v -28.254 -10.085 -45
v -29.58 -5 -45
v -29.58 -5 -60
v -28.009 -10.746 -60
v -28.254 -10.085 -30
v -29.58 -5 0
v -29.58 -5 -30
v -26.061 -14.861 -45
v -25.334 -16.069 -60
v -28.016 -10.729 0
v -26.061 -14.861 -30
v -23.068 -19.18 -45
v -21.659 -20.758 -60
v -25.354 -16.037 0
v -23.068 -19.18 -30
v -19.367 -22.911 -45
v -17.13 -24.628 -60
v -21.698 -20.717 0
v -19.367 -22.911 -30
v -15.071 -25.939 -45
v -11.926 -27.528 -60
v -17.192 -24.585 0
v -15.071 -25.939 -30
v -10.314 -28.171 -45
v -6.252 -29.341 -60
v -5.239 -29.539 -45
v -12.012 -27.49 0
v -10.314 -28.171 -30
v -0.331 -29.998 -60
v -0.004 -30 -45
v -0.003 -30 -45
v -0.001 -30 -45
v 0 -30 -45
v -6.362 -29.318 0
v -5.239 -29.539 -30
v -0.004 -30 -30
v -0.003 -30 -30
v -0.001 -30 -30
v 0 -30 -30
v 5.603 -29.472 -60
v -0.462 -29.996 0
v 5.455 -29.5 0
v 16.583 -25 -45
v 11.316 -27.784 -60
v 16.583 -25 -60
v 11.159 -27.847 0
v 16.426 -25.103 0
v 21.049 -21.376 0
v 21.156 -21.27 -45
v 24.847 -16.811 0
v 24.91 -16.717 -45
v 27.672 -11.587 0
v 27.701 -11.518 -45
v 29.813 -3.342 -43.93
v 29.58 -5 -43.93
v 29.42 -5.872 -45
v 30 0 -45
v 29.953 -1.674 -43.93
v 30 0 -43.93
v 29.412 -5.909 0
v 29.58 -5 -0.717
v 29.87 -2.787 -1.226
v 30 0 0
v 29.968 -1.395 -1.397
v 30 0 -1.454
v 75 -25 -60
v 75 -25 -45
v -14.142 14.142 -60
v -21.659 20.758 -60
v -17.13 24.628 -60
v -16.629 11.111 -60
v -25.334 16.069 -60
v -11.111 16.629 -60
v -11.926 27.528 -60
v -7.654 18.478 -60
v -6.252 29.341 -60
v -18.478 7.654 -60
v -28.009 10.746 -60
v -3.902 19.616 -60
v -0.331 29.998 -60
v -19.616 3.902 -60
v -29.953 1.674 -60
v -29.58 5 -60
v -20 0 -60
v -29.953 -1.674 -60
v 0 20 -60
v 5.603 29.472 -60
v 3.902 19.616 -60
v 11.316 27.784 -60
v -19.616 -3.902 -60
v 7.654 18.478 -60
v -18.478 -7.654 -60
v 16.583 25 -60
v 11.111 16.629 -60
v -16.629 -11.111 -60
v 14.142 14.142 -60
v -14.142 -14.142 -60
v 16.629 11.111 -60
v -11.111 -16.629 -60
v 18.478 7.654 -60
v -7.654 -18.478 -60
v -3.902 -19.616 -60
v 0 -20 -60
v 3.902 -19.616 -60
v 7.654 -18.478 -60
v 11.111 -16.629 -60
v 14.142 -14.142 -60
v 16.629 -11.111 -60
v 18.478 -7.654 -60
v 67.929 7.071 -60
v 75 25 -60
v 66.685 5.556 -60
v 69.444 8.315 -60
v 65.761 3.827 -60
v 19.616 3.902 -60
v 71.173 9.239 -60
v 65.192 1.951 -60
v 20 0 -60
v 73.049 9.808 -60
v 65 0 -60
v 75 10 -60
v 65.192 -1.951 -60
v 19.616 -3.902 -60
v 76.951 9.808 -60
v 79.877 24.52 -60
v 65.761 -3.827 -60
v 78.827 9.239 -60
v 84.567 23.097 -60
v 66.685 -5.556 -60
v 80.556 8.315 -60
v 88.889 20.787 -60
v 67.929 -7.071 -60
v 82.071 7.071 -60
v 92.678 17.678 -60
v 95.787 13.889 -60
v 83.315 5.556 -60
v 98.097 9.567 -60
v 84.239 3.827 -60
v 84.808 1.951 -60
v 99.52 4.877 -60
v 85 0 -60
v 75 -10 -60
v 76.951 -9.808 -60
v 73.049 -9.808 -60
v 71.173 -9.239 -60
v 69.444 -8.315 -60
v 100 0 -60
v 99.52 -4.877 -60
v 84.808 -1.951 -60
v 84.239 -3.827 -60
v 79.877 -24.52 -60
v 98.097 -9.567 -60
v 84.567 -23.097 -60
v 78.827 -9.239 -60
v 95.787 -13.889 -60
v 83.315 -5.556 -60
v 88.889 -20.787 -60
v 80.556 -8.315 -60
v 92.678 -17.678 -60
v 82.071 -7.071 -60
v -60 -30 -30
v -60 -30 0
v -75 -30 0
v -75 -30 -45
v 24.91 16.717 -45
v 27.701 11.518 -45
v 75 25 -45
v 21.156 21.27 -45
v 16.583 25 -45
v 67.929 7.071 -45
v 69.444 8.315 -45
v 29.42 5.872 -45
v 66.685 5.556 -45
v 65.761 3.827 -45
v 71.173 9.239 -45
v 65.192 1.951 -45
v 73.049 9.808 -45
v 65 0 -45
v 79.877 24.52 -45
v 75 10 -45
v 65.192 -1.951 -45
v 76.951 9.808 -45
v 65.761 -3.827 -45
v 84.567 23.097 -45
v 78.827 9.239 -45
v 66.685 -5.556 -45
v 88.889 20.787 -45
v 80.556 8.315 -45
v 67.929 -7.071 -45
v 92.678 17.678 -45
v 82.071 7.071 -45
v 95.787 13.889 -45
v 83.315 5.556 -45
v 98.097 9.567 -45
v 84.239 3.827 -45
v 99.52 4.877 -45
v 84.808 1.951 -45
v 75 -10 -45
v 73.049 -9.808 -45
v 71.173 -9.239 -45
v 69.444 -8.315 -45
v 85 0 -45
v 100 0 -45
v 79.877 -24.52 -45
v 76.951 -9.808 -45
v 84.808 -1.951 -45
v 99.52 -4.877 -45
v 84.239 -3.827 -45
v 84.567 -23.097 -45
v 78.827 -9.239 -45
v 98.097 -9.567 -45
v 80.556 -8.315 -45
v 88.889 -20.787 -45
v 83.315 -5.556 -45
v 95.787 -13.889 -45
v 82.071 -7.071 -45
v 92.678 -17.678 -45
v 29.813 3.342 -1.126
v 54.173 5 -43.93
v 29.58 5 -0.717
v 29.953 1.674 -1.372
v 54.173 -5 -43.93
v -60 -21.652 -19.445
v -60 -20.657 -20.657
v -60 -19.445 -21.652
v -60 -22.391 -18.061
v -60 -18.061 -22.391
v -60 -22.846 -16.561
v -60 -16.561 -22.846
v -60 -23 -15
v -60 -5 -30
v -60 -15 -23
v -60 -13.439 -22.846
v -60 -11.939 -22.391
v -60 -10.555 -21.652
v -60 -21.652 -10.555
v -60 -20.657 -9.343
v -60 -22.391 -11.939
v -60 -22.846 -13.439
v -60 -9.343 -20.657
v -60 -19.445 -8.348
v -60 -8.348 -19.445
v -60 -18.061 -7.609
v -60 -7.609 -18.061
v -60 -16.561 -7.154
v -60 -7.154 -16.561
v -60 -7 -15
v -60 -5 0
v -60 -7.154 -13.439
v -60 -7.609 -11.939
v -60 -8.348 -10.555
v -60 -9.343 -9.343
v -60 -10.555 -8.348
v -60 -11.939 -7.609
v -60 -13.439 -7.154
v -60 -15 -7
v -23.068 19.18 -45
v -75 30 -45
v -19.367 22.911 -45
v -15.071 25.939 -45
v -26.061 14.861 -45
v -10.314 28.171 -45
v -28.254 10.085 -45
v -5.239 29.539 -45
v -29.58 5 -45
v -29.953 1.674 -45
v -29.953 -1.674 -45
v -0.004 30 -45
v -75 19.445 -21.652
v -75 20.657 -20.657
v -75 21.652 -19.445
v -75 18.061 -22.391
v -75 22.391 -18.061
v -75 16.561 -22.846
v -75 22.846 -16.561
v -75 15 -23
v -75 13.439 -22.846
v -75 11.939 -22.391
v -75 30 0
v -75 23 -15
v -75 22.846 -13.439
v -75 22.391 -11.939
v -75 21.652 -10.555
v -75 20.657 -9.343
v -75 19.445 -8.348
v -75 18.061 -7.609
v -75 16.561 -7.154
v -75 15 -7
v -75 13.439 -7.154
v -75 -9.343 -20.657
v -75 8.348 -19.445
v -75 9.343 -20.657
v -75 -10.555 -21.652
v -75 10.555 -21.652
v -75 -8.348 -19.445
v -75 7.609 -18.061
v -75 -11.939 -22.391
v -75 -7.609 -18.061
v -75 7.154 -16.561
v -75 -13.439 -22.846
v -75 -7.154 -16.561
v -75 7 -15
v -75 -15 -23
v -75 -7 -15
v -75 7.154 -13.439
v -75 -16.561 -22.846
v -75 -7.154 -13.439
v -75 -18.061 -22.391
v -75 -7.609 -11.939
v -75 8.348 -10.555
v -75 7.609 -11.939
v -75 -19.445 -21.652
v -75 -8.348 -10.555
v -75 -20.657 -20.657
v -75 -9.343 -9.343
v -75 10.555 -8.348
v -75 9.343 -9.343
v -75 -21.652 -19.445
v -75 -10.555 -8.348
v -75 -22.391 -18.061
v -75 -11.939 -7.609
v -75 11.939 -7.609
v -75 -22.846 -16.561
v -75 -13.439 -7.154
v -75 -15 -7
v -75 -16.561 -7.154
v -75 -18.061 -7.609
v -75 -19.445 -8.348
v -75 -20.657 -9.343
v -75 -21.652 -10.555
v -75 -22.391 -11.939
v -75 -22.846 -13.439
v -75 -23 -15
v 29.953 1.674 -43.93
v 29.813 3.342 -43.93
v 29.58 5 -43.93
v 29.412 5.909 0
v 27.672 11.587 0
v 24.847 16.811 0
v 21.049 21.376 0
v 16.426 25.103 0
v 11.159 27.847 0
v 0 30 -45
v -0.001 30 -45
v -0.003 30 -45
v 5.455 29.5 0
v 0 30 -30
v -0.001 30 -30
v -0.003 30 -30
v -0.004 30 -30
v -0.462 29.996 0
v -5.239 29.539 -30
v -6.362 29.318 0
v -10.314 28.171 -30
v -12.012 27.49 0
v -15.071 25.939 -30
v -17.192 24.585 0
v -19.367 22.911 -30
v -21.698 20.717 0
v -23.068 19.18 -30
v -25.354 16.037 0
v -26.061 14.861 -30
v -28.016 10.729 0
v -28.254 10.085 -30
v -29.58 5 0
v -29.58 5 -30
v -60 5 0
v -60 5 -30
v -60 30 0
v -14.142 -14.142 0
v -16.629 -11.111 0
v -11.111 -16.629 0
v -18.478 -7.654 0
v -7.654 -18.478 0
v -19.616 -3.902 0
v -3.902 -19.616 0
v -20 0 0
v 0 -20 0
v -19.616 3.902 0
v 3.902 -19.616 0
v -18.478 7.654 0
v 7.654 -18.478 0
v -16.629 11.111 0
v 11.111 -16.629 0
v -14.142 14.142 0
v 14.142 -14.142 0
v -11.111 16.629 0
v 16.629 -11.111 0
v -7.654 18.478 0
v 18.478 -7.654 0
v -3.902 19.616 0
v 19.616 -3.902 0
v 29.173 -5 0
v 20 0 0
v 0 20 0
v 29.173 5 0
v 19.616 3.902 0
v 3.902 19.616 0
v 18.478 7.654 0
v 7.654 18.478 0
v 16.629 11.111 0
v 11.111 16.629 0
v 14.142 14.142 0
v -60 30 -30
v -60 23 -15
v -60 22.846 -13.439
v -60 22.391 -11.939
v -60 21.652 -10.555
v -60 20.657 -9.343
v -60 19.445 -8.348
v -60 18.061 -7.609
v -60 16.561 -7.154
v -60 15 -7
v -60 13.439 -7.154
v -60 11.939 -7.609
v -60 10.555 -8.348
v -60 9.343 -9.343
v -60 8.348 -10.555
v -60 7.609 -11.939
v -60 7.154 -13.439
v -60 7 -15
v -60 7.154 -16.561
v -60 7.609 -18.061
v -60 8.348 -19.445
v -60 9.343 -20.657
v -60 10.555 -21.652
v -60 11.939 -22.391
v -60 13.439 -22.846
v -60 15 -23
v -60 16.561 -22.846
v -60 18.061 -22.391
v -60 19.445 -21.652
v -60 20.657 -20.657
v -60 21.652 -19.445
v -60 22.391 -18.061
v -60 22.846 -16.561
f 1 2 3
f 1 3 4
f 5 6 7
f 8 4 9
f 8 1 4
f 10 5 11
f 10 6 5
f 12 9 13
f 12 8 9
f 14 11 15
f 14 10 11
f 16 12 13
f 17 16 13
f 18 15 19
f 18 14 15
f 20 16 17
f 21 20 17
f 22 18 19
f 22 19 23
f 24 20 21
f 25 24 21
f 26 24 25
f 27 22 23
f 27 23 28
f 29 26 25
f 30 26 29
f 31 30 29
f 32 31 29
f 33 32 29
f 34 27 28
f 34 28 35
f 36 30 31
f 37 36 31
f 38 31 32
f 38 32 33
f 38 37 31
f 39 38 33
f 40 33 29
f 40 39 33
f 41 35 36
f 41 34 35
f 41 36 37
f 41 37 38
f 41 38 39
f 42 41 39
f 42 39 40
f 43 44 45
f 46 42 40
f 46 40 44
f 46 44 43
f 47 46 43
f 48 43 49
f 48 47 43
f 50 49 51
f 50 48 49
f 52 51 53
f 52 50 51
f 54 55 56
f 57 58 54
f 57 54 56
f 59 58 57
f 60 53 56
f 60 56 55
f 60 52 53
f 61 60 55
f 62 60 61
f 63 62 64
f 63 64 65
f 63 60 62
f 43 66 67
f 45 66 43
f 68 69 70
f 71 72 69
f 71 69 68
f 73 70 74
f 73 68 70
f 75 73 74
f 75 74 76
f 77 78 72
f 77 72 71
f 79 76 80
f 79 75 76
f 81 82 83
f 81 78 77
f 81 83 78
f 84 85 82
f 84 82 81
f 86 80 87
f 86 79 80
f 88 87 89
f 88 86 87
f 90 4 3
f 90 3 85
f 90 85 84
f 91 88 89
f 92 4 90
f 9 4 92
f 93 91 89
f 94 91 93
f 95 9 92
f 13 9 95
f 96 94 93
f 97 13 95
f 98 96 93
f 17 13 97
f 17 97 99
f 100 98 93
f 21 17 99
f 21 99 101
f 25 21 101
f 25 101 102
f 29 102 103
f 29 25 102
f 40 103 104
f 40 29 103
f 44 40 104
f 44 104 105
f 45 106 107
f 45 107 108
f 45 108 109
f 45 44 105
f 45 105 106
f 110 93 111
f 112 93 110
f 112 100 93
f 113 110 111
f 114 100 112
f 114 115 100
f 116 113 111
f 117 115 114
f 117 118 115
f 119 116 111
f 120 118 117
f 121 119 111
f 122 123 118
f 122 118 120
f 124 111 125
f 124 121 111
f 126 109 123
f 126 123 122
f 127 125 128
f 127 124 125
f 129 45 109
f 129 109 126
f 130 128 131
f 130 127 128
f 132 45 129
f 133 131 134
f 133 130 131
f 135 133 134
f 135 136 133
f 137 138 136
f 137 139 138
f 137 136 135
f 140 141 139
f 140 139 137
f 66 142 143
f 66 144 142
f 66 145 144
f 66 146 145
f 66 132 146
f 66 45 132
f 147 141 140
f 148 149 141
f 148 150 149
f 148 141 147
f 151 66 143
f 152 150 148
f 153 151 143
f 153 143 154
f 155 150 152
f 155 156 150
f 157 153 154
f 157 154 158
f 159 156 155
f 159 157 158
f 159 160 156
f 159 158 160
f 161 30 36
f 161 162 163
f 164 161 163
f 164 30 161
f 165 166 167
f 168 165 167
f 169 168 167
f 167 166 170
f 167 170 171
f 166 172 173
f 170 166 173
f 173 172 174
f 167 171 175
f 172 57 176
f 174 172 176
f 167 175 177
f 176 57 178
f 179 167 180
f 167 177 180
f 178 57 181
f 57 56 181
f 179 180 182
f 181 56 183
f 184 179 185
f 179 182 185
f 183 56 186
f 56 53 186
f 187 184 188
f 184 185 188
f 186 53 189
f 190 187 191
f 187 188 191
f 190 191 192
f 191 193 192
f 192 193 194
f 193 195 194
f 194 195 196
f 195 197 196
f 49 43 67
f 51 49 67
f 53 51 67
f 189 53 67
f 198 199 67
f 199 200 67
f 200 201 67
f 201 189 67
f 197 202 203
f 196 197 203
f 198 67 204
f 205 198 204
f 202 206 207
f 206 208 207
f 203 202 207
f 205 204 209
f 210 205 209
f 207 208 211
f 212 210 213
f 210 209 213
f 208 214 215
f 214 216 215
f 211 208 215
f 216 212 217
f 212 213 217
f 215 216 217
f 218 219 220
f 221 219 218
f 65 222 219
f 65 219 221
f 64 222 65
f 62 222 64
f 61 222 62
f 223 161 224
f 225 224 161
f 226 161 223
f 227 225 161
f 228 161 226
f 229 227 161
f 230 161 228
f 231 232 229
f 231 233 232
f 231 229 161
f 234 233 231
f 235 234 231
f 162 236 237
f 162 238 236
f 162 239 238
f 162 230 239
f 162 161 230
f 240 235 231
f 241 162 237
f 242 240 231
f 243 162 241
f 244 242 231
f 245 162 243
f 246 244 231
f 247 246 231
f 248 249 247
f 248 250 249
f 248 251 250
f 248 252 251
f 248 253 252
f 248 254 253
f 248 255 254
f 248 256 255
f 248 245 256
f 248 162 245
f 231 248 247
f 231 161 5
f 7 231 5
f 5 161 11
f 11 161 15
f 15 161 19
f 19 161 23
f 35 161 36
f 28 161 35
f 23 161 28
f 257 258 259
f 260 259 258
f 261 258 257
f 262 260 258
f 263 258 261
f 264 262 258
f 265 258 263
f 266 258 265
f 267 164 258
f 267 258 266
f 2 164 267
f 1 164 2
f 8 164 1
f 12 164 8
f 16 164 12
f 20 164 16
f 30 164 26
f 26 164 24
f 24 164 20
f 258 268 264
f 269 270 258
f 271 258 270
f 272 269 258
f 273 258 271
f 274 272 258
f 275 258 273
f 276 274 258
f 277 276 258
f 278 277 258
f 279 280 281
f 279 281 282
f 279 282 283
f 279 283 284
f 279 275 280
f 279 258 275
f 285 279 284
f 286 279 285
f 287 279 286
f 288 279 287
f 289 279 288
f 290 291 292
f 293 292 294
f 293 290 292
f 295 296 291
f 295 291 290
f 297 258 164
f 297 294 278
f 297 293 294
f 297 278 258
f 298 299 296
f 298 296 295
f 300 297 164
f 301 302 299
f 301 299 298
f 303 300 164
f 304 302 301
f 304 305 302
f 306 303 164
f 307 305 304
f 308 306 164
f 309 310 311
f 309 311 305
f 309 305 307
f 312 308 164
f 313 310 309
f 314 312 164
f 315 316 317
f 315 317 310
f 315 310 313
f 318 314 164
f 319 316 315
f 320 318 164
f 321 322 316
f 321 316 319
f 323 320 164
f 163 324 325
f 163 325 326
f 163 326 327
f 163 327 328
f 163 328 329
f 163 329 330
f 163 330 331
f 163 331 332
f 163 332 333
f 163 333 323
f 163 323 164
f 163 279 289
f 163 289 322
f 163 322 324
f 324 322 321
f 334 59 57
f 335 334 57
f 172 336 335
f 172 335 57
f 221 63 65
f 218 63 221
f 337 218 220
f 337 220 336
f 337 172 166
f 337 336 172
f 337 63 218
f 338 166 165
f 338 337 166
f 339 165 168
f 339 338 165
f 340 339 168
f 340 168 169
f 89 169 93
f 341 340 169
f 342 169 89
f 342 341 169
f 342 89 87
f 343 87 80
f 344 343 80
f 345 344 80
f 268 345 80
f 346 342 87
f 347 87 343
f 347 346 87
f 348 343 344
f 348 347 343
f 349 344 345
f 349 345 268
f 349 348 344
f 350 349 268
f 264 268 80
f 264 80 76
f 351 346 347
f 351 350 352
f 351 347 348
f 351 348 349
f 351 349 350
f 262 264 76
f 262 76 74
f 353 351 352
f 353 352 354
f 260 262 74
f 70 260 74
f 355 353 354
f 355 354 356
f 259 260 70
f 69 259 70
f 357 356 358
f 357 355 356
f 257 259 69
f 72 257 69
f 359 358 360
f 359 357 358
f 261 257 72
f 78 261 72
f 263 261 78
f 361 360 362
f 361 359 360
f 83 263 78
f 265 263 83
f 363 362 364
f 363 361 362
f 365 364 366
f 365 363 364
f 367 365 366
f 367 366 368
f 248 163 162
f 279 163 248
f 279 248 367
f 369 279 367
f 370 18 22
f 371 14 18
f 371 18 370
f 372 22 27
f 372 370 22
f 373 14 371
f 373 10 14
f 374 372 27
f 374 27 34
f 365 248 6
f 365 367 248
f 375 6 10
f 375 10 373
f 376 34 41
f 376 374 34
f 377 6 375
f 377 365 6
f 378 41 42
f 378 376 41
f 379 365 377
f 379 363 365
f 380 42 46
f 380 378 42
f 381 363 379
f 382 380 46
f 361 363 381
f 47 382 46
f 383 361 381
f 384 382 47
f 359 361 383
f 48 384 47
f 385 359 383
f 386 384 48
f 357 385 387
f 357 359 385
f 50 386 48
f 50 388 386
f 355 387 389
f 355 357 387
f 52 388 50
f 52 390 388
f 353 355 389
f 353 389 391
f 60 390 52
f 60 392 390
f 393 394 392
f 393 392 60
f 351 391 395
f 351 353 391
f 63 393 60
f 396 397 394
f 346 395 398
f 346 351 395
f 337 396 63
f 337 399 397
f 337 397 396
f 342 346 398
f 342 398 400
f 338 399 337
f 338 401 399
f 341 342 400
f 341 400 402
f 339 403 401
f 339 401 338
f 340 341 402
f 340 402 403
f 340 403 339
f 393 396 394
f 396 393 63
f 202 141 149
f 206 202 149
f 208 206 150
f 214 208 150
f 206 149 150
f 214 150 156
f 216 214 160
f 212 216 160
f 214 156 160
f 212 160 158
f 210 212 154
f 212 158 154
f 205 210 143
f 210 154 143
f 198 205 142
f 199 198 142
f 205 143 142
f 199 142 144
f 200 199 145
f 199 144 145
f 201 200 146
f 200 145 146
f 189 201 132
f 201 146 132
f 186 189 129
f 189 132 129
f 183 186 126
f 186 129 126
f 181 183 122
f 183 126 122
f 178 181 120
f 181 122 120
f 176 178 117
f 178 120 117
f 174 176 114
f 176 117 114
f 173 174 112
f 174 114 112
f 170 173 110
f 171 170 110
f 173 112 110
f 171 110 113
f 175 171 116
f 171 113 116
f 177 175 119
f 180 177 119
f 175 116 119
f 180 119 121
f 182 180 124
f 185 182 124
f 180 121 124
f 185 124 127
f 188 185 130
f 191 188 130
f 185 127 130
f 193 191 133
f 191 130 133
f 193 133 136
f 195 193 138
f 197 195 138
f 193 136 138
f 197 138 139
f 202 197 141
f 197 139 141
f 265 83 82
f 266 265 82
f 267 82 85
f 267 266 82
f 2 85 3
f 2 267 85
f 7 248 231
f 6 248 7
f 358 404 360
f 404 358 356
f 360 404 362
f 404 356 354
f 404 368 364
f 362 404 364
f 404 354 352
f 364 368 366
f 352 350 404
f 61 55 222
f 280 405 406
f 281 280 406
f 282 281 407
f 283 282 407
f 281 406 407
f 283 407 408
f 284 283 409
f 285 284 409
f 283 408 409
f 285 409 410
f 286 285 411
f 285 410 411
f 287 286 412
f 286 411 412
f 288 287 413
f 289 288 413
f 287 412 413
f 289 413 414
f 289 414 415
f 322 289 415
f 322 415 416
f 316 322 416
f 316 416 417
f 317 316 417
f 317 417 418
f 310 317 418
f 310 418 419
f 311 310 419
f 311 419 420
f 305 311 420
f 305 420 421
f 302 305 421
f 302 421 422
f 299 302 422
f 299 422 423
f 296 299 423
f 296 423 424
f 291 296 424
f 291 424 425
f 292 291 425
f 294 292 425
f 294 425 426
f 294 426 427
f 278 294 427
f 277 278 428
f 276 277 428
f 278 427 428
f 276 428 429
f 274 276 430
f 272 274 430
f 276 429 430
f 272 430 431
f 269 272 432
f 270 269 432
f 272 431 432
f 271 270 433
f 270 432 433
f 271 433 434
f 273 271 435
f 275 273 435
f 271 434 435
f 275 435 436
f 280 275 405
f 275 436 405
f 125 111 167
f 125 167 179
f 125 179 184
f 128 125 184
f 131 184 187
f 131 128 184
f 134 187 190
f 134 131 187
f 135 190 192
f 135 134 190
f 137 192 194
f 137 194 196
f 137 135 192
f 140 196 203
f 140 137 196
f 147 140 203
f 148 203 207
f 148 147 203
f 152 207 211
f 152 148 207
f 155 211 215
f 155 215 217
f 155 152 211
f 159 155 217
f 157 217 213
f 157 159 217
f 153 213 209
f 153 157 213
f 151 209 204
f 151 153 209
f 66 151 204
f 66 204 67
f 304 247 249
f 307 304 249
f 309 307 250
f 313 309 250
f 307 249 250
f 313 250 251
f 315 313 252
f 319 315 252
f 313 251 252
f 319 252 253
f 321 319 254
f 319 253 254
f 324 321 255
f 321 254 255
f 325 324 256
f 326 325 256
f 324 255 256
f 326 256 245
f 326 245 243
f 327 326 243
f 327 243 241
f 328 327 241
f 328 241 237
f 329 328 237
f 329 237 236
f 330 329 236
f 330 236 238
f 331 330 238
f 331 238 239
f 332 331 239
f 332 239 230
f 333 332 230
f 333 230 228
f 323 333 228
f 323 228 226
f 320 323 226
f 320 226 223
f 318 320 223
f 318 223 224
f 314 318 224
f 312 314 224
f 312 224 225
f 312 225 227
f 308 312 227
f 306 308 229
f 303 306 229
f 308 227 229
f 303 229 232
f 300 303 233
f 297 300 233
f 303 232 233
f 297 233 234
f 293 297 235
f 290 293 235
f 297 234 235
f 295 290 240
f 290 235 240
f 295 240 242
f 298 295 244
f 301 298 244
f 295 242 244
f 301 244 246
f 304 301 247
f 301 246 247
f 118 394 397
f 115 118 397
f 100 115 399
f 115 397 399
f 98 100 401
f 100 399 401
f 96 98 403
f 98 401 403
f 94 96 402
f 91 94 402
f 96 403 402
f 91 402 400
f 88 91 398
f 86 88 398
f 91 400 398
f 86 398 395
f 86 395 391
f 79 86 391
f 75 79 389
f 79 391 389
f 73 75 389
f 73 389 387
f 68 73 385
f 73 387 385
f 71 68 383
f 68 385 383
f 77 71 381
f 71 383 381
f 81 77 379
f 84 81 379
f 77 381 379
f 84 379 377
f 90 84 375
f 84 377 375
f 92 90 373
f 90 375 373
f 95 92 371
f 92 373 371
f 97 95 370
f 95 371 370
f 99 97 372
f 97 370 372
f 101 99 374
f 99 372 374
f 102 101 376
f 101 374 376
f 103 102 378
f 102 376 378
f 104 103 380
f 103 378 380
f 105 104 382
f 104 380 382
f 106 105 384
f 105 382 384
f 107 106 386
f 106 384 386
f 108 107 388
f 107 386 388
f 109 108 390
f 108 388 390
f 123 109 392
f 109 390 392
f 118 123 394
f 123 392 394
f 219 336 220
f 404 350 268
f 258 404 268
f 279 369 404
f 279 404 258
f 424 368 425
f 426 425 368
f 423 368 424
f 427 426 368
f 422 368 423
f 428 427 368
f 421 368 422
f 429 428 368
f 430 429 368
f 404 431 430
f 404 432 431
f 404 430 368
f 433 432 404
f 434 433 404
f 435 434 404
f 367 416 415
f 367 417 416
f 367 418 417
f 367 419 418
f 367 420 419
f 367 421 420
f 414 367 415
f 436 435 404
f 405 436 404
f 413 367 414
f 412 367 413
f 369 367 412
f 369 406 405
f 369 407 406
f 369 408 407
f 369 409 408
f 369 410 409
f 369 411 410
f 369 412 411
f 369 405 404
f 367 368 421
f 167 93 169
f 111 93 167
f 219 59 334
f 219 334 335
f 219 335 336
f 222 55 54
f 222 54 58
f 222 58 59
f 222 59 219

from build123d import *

# Parameters (mm, degrees)
F0_R      = 20
F1_DEPTH  = 60
F2_R      = 10
F3_DEPTH  = 15
F4_DEPTH  = 45
F6_DEPTH  = 15
F8_DEPTH  = 5
F9_R      = 8
F10_DEPTH = 15.001


with BuildPart() as f1:
    # F0 (on Top) → F1 (new body)
    with BuildSketch(Plane.XY):
        with BuildLine():
            ThreePointArc((-29.580399, -5), (2.508788, -29.894916), (30, 0))
            ThreePointArc((30, 0), (2.508788, 29.894916), (-29.580399, 5))
            ThreePointArc((-29.580399, 5), (-30, 0), (-29.580399, -5))
        make_face()
        Circle(F0_R, mode=Mode.SUBTRACT)
    extrude(amount=-F1_DEPTH)

    # F2 (on face) → F3 (join)
    with BuildSketch(Plane(origin=(0, 0, -60), x_dir=(1, 0, 0), z_dir=(0, 0, -1))):
        with BuildLine():
            Line((16.583124, -25), (75, -25))
            ThreePointArc((75, -25), (100, 0), (75, 25))
            Line((75, 25), (16.583124, 25))
            ThreePointArc((16.583124, 25), (26.43382, 14.186372), (30, 0))
            ThreePointArc((30, 0), (26.43382, -14.186372), (16.583124, -25))
        make_face()
        with Locations((75, 0)):
            Circle(F2_R, mode=Mode.SUBTRACT)
    extrude(amount=-F3_DEPTH)

    # F0 (on Top) → F4 (join)
    with BuildSketch(Plane.XY):
        with BuildLine():
            ThreePointArc((-29.580399, -5), (-30, 0), (-29.580399, 5))
            Line((-29.580399, 5), (-60, 5))
            Line((-60, 5), (-60, 30))
            Line((-60, 30), (-74.087851, 30))
            Line((-74.087851, 30), (-75, 30))
            Line((-75, 30), (-75, 0))
            Line((-75, 0), (-75, -30))
            Line((-75, -30), (-60, -30))
            Line((-60, -30), (-60, -5))
            Line((-60, -5), (-29.580399, -5))
        make_face()
    extrude(amount=-F4_DEPTH)

    # F5 (on face) → F6 (join)
    with BuildSketch(Plane(origin=(0, 0, -45), x_dir=(1, 0, 0), z_dir=(0, 0, -1))):
        with BuildLine():
            Line((0, 30), (-60, 30))
            Line((-60, 30), (-60, -30))
            Line((-60, -30), (0, -30))
            ThreePointArc((0, -30), (-30, 0), (0, 30))
        make_face()
    extrude(amount=-F6_DEPTH)

    # F7 (on Front) → F8 (join, symmetric)
    with BuildSketch(Plane.XZ):
        Polygon((29.172541, 0), (29.172541, -43.929927), (54.172541, -43.929927), align=None)
    extrude(amount=F8_DEPTH, both=True)

    # F9 (on face) → F10 (cut, through all)
    with BuildSketch(Plane.YZ.offset(-60)):
        with Locations((-15, -15)):
            Circle(F9_R)
        with Locations((15, -15)):
            Circle(F9_R)
    extrude(amount=-F10_DEPTH, mode=Mode.SUBTRACT)


solid = f1.part
